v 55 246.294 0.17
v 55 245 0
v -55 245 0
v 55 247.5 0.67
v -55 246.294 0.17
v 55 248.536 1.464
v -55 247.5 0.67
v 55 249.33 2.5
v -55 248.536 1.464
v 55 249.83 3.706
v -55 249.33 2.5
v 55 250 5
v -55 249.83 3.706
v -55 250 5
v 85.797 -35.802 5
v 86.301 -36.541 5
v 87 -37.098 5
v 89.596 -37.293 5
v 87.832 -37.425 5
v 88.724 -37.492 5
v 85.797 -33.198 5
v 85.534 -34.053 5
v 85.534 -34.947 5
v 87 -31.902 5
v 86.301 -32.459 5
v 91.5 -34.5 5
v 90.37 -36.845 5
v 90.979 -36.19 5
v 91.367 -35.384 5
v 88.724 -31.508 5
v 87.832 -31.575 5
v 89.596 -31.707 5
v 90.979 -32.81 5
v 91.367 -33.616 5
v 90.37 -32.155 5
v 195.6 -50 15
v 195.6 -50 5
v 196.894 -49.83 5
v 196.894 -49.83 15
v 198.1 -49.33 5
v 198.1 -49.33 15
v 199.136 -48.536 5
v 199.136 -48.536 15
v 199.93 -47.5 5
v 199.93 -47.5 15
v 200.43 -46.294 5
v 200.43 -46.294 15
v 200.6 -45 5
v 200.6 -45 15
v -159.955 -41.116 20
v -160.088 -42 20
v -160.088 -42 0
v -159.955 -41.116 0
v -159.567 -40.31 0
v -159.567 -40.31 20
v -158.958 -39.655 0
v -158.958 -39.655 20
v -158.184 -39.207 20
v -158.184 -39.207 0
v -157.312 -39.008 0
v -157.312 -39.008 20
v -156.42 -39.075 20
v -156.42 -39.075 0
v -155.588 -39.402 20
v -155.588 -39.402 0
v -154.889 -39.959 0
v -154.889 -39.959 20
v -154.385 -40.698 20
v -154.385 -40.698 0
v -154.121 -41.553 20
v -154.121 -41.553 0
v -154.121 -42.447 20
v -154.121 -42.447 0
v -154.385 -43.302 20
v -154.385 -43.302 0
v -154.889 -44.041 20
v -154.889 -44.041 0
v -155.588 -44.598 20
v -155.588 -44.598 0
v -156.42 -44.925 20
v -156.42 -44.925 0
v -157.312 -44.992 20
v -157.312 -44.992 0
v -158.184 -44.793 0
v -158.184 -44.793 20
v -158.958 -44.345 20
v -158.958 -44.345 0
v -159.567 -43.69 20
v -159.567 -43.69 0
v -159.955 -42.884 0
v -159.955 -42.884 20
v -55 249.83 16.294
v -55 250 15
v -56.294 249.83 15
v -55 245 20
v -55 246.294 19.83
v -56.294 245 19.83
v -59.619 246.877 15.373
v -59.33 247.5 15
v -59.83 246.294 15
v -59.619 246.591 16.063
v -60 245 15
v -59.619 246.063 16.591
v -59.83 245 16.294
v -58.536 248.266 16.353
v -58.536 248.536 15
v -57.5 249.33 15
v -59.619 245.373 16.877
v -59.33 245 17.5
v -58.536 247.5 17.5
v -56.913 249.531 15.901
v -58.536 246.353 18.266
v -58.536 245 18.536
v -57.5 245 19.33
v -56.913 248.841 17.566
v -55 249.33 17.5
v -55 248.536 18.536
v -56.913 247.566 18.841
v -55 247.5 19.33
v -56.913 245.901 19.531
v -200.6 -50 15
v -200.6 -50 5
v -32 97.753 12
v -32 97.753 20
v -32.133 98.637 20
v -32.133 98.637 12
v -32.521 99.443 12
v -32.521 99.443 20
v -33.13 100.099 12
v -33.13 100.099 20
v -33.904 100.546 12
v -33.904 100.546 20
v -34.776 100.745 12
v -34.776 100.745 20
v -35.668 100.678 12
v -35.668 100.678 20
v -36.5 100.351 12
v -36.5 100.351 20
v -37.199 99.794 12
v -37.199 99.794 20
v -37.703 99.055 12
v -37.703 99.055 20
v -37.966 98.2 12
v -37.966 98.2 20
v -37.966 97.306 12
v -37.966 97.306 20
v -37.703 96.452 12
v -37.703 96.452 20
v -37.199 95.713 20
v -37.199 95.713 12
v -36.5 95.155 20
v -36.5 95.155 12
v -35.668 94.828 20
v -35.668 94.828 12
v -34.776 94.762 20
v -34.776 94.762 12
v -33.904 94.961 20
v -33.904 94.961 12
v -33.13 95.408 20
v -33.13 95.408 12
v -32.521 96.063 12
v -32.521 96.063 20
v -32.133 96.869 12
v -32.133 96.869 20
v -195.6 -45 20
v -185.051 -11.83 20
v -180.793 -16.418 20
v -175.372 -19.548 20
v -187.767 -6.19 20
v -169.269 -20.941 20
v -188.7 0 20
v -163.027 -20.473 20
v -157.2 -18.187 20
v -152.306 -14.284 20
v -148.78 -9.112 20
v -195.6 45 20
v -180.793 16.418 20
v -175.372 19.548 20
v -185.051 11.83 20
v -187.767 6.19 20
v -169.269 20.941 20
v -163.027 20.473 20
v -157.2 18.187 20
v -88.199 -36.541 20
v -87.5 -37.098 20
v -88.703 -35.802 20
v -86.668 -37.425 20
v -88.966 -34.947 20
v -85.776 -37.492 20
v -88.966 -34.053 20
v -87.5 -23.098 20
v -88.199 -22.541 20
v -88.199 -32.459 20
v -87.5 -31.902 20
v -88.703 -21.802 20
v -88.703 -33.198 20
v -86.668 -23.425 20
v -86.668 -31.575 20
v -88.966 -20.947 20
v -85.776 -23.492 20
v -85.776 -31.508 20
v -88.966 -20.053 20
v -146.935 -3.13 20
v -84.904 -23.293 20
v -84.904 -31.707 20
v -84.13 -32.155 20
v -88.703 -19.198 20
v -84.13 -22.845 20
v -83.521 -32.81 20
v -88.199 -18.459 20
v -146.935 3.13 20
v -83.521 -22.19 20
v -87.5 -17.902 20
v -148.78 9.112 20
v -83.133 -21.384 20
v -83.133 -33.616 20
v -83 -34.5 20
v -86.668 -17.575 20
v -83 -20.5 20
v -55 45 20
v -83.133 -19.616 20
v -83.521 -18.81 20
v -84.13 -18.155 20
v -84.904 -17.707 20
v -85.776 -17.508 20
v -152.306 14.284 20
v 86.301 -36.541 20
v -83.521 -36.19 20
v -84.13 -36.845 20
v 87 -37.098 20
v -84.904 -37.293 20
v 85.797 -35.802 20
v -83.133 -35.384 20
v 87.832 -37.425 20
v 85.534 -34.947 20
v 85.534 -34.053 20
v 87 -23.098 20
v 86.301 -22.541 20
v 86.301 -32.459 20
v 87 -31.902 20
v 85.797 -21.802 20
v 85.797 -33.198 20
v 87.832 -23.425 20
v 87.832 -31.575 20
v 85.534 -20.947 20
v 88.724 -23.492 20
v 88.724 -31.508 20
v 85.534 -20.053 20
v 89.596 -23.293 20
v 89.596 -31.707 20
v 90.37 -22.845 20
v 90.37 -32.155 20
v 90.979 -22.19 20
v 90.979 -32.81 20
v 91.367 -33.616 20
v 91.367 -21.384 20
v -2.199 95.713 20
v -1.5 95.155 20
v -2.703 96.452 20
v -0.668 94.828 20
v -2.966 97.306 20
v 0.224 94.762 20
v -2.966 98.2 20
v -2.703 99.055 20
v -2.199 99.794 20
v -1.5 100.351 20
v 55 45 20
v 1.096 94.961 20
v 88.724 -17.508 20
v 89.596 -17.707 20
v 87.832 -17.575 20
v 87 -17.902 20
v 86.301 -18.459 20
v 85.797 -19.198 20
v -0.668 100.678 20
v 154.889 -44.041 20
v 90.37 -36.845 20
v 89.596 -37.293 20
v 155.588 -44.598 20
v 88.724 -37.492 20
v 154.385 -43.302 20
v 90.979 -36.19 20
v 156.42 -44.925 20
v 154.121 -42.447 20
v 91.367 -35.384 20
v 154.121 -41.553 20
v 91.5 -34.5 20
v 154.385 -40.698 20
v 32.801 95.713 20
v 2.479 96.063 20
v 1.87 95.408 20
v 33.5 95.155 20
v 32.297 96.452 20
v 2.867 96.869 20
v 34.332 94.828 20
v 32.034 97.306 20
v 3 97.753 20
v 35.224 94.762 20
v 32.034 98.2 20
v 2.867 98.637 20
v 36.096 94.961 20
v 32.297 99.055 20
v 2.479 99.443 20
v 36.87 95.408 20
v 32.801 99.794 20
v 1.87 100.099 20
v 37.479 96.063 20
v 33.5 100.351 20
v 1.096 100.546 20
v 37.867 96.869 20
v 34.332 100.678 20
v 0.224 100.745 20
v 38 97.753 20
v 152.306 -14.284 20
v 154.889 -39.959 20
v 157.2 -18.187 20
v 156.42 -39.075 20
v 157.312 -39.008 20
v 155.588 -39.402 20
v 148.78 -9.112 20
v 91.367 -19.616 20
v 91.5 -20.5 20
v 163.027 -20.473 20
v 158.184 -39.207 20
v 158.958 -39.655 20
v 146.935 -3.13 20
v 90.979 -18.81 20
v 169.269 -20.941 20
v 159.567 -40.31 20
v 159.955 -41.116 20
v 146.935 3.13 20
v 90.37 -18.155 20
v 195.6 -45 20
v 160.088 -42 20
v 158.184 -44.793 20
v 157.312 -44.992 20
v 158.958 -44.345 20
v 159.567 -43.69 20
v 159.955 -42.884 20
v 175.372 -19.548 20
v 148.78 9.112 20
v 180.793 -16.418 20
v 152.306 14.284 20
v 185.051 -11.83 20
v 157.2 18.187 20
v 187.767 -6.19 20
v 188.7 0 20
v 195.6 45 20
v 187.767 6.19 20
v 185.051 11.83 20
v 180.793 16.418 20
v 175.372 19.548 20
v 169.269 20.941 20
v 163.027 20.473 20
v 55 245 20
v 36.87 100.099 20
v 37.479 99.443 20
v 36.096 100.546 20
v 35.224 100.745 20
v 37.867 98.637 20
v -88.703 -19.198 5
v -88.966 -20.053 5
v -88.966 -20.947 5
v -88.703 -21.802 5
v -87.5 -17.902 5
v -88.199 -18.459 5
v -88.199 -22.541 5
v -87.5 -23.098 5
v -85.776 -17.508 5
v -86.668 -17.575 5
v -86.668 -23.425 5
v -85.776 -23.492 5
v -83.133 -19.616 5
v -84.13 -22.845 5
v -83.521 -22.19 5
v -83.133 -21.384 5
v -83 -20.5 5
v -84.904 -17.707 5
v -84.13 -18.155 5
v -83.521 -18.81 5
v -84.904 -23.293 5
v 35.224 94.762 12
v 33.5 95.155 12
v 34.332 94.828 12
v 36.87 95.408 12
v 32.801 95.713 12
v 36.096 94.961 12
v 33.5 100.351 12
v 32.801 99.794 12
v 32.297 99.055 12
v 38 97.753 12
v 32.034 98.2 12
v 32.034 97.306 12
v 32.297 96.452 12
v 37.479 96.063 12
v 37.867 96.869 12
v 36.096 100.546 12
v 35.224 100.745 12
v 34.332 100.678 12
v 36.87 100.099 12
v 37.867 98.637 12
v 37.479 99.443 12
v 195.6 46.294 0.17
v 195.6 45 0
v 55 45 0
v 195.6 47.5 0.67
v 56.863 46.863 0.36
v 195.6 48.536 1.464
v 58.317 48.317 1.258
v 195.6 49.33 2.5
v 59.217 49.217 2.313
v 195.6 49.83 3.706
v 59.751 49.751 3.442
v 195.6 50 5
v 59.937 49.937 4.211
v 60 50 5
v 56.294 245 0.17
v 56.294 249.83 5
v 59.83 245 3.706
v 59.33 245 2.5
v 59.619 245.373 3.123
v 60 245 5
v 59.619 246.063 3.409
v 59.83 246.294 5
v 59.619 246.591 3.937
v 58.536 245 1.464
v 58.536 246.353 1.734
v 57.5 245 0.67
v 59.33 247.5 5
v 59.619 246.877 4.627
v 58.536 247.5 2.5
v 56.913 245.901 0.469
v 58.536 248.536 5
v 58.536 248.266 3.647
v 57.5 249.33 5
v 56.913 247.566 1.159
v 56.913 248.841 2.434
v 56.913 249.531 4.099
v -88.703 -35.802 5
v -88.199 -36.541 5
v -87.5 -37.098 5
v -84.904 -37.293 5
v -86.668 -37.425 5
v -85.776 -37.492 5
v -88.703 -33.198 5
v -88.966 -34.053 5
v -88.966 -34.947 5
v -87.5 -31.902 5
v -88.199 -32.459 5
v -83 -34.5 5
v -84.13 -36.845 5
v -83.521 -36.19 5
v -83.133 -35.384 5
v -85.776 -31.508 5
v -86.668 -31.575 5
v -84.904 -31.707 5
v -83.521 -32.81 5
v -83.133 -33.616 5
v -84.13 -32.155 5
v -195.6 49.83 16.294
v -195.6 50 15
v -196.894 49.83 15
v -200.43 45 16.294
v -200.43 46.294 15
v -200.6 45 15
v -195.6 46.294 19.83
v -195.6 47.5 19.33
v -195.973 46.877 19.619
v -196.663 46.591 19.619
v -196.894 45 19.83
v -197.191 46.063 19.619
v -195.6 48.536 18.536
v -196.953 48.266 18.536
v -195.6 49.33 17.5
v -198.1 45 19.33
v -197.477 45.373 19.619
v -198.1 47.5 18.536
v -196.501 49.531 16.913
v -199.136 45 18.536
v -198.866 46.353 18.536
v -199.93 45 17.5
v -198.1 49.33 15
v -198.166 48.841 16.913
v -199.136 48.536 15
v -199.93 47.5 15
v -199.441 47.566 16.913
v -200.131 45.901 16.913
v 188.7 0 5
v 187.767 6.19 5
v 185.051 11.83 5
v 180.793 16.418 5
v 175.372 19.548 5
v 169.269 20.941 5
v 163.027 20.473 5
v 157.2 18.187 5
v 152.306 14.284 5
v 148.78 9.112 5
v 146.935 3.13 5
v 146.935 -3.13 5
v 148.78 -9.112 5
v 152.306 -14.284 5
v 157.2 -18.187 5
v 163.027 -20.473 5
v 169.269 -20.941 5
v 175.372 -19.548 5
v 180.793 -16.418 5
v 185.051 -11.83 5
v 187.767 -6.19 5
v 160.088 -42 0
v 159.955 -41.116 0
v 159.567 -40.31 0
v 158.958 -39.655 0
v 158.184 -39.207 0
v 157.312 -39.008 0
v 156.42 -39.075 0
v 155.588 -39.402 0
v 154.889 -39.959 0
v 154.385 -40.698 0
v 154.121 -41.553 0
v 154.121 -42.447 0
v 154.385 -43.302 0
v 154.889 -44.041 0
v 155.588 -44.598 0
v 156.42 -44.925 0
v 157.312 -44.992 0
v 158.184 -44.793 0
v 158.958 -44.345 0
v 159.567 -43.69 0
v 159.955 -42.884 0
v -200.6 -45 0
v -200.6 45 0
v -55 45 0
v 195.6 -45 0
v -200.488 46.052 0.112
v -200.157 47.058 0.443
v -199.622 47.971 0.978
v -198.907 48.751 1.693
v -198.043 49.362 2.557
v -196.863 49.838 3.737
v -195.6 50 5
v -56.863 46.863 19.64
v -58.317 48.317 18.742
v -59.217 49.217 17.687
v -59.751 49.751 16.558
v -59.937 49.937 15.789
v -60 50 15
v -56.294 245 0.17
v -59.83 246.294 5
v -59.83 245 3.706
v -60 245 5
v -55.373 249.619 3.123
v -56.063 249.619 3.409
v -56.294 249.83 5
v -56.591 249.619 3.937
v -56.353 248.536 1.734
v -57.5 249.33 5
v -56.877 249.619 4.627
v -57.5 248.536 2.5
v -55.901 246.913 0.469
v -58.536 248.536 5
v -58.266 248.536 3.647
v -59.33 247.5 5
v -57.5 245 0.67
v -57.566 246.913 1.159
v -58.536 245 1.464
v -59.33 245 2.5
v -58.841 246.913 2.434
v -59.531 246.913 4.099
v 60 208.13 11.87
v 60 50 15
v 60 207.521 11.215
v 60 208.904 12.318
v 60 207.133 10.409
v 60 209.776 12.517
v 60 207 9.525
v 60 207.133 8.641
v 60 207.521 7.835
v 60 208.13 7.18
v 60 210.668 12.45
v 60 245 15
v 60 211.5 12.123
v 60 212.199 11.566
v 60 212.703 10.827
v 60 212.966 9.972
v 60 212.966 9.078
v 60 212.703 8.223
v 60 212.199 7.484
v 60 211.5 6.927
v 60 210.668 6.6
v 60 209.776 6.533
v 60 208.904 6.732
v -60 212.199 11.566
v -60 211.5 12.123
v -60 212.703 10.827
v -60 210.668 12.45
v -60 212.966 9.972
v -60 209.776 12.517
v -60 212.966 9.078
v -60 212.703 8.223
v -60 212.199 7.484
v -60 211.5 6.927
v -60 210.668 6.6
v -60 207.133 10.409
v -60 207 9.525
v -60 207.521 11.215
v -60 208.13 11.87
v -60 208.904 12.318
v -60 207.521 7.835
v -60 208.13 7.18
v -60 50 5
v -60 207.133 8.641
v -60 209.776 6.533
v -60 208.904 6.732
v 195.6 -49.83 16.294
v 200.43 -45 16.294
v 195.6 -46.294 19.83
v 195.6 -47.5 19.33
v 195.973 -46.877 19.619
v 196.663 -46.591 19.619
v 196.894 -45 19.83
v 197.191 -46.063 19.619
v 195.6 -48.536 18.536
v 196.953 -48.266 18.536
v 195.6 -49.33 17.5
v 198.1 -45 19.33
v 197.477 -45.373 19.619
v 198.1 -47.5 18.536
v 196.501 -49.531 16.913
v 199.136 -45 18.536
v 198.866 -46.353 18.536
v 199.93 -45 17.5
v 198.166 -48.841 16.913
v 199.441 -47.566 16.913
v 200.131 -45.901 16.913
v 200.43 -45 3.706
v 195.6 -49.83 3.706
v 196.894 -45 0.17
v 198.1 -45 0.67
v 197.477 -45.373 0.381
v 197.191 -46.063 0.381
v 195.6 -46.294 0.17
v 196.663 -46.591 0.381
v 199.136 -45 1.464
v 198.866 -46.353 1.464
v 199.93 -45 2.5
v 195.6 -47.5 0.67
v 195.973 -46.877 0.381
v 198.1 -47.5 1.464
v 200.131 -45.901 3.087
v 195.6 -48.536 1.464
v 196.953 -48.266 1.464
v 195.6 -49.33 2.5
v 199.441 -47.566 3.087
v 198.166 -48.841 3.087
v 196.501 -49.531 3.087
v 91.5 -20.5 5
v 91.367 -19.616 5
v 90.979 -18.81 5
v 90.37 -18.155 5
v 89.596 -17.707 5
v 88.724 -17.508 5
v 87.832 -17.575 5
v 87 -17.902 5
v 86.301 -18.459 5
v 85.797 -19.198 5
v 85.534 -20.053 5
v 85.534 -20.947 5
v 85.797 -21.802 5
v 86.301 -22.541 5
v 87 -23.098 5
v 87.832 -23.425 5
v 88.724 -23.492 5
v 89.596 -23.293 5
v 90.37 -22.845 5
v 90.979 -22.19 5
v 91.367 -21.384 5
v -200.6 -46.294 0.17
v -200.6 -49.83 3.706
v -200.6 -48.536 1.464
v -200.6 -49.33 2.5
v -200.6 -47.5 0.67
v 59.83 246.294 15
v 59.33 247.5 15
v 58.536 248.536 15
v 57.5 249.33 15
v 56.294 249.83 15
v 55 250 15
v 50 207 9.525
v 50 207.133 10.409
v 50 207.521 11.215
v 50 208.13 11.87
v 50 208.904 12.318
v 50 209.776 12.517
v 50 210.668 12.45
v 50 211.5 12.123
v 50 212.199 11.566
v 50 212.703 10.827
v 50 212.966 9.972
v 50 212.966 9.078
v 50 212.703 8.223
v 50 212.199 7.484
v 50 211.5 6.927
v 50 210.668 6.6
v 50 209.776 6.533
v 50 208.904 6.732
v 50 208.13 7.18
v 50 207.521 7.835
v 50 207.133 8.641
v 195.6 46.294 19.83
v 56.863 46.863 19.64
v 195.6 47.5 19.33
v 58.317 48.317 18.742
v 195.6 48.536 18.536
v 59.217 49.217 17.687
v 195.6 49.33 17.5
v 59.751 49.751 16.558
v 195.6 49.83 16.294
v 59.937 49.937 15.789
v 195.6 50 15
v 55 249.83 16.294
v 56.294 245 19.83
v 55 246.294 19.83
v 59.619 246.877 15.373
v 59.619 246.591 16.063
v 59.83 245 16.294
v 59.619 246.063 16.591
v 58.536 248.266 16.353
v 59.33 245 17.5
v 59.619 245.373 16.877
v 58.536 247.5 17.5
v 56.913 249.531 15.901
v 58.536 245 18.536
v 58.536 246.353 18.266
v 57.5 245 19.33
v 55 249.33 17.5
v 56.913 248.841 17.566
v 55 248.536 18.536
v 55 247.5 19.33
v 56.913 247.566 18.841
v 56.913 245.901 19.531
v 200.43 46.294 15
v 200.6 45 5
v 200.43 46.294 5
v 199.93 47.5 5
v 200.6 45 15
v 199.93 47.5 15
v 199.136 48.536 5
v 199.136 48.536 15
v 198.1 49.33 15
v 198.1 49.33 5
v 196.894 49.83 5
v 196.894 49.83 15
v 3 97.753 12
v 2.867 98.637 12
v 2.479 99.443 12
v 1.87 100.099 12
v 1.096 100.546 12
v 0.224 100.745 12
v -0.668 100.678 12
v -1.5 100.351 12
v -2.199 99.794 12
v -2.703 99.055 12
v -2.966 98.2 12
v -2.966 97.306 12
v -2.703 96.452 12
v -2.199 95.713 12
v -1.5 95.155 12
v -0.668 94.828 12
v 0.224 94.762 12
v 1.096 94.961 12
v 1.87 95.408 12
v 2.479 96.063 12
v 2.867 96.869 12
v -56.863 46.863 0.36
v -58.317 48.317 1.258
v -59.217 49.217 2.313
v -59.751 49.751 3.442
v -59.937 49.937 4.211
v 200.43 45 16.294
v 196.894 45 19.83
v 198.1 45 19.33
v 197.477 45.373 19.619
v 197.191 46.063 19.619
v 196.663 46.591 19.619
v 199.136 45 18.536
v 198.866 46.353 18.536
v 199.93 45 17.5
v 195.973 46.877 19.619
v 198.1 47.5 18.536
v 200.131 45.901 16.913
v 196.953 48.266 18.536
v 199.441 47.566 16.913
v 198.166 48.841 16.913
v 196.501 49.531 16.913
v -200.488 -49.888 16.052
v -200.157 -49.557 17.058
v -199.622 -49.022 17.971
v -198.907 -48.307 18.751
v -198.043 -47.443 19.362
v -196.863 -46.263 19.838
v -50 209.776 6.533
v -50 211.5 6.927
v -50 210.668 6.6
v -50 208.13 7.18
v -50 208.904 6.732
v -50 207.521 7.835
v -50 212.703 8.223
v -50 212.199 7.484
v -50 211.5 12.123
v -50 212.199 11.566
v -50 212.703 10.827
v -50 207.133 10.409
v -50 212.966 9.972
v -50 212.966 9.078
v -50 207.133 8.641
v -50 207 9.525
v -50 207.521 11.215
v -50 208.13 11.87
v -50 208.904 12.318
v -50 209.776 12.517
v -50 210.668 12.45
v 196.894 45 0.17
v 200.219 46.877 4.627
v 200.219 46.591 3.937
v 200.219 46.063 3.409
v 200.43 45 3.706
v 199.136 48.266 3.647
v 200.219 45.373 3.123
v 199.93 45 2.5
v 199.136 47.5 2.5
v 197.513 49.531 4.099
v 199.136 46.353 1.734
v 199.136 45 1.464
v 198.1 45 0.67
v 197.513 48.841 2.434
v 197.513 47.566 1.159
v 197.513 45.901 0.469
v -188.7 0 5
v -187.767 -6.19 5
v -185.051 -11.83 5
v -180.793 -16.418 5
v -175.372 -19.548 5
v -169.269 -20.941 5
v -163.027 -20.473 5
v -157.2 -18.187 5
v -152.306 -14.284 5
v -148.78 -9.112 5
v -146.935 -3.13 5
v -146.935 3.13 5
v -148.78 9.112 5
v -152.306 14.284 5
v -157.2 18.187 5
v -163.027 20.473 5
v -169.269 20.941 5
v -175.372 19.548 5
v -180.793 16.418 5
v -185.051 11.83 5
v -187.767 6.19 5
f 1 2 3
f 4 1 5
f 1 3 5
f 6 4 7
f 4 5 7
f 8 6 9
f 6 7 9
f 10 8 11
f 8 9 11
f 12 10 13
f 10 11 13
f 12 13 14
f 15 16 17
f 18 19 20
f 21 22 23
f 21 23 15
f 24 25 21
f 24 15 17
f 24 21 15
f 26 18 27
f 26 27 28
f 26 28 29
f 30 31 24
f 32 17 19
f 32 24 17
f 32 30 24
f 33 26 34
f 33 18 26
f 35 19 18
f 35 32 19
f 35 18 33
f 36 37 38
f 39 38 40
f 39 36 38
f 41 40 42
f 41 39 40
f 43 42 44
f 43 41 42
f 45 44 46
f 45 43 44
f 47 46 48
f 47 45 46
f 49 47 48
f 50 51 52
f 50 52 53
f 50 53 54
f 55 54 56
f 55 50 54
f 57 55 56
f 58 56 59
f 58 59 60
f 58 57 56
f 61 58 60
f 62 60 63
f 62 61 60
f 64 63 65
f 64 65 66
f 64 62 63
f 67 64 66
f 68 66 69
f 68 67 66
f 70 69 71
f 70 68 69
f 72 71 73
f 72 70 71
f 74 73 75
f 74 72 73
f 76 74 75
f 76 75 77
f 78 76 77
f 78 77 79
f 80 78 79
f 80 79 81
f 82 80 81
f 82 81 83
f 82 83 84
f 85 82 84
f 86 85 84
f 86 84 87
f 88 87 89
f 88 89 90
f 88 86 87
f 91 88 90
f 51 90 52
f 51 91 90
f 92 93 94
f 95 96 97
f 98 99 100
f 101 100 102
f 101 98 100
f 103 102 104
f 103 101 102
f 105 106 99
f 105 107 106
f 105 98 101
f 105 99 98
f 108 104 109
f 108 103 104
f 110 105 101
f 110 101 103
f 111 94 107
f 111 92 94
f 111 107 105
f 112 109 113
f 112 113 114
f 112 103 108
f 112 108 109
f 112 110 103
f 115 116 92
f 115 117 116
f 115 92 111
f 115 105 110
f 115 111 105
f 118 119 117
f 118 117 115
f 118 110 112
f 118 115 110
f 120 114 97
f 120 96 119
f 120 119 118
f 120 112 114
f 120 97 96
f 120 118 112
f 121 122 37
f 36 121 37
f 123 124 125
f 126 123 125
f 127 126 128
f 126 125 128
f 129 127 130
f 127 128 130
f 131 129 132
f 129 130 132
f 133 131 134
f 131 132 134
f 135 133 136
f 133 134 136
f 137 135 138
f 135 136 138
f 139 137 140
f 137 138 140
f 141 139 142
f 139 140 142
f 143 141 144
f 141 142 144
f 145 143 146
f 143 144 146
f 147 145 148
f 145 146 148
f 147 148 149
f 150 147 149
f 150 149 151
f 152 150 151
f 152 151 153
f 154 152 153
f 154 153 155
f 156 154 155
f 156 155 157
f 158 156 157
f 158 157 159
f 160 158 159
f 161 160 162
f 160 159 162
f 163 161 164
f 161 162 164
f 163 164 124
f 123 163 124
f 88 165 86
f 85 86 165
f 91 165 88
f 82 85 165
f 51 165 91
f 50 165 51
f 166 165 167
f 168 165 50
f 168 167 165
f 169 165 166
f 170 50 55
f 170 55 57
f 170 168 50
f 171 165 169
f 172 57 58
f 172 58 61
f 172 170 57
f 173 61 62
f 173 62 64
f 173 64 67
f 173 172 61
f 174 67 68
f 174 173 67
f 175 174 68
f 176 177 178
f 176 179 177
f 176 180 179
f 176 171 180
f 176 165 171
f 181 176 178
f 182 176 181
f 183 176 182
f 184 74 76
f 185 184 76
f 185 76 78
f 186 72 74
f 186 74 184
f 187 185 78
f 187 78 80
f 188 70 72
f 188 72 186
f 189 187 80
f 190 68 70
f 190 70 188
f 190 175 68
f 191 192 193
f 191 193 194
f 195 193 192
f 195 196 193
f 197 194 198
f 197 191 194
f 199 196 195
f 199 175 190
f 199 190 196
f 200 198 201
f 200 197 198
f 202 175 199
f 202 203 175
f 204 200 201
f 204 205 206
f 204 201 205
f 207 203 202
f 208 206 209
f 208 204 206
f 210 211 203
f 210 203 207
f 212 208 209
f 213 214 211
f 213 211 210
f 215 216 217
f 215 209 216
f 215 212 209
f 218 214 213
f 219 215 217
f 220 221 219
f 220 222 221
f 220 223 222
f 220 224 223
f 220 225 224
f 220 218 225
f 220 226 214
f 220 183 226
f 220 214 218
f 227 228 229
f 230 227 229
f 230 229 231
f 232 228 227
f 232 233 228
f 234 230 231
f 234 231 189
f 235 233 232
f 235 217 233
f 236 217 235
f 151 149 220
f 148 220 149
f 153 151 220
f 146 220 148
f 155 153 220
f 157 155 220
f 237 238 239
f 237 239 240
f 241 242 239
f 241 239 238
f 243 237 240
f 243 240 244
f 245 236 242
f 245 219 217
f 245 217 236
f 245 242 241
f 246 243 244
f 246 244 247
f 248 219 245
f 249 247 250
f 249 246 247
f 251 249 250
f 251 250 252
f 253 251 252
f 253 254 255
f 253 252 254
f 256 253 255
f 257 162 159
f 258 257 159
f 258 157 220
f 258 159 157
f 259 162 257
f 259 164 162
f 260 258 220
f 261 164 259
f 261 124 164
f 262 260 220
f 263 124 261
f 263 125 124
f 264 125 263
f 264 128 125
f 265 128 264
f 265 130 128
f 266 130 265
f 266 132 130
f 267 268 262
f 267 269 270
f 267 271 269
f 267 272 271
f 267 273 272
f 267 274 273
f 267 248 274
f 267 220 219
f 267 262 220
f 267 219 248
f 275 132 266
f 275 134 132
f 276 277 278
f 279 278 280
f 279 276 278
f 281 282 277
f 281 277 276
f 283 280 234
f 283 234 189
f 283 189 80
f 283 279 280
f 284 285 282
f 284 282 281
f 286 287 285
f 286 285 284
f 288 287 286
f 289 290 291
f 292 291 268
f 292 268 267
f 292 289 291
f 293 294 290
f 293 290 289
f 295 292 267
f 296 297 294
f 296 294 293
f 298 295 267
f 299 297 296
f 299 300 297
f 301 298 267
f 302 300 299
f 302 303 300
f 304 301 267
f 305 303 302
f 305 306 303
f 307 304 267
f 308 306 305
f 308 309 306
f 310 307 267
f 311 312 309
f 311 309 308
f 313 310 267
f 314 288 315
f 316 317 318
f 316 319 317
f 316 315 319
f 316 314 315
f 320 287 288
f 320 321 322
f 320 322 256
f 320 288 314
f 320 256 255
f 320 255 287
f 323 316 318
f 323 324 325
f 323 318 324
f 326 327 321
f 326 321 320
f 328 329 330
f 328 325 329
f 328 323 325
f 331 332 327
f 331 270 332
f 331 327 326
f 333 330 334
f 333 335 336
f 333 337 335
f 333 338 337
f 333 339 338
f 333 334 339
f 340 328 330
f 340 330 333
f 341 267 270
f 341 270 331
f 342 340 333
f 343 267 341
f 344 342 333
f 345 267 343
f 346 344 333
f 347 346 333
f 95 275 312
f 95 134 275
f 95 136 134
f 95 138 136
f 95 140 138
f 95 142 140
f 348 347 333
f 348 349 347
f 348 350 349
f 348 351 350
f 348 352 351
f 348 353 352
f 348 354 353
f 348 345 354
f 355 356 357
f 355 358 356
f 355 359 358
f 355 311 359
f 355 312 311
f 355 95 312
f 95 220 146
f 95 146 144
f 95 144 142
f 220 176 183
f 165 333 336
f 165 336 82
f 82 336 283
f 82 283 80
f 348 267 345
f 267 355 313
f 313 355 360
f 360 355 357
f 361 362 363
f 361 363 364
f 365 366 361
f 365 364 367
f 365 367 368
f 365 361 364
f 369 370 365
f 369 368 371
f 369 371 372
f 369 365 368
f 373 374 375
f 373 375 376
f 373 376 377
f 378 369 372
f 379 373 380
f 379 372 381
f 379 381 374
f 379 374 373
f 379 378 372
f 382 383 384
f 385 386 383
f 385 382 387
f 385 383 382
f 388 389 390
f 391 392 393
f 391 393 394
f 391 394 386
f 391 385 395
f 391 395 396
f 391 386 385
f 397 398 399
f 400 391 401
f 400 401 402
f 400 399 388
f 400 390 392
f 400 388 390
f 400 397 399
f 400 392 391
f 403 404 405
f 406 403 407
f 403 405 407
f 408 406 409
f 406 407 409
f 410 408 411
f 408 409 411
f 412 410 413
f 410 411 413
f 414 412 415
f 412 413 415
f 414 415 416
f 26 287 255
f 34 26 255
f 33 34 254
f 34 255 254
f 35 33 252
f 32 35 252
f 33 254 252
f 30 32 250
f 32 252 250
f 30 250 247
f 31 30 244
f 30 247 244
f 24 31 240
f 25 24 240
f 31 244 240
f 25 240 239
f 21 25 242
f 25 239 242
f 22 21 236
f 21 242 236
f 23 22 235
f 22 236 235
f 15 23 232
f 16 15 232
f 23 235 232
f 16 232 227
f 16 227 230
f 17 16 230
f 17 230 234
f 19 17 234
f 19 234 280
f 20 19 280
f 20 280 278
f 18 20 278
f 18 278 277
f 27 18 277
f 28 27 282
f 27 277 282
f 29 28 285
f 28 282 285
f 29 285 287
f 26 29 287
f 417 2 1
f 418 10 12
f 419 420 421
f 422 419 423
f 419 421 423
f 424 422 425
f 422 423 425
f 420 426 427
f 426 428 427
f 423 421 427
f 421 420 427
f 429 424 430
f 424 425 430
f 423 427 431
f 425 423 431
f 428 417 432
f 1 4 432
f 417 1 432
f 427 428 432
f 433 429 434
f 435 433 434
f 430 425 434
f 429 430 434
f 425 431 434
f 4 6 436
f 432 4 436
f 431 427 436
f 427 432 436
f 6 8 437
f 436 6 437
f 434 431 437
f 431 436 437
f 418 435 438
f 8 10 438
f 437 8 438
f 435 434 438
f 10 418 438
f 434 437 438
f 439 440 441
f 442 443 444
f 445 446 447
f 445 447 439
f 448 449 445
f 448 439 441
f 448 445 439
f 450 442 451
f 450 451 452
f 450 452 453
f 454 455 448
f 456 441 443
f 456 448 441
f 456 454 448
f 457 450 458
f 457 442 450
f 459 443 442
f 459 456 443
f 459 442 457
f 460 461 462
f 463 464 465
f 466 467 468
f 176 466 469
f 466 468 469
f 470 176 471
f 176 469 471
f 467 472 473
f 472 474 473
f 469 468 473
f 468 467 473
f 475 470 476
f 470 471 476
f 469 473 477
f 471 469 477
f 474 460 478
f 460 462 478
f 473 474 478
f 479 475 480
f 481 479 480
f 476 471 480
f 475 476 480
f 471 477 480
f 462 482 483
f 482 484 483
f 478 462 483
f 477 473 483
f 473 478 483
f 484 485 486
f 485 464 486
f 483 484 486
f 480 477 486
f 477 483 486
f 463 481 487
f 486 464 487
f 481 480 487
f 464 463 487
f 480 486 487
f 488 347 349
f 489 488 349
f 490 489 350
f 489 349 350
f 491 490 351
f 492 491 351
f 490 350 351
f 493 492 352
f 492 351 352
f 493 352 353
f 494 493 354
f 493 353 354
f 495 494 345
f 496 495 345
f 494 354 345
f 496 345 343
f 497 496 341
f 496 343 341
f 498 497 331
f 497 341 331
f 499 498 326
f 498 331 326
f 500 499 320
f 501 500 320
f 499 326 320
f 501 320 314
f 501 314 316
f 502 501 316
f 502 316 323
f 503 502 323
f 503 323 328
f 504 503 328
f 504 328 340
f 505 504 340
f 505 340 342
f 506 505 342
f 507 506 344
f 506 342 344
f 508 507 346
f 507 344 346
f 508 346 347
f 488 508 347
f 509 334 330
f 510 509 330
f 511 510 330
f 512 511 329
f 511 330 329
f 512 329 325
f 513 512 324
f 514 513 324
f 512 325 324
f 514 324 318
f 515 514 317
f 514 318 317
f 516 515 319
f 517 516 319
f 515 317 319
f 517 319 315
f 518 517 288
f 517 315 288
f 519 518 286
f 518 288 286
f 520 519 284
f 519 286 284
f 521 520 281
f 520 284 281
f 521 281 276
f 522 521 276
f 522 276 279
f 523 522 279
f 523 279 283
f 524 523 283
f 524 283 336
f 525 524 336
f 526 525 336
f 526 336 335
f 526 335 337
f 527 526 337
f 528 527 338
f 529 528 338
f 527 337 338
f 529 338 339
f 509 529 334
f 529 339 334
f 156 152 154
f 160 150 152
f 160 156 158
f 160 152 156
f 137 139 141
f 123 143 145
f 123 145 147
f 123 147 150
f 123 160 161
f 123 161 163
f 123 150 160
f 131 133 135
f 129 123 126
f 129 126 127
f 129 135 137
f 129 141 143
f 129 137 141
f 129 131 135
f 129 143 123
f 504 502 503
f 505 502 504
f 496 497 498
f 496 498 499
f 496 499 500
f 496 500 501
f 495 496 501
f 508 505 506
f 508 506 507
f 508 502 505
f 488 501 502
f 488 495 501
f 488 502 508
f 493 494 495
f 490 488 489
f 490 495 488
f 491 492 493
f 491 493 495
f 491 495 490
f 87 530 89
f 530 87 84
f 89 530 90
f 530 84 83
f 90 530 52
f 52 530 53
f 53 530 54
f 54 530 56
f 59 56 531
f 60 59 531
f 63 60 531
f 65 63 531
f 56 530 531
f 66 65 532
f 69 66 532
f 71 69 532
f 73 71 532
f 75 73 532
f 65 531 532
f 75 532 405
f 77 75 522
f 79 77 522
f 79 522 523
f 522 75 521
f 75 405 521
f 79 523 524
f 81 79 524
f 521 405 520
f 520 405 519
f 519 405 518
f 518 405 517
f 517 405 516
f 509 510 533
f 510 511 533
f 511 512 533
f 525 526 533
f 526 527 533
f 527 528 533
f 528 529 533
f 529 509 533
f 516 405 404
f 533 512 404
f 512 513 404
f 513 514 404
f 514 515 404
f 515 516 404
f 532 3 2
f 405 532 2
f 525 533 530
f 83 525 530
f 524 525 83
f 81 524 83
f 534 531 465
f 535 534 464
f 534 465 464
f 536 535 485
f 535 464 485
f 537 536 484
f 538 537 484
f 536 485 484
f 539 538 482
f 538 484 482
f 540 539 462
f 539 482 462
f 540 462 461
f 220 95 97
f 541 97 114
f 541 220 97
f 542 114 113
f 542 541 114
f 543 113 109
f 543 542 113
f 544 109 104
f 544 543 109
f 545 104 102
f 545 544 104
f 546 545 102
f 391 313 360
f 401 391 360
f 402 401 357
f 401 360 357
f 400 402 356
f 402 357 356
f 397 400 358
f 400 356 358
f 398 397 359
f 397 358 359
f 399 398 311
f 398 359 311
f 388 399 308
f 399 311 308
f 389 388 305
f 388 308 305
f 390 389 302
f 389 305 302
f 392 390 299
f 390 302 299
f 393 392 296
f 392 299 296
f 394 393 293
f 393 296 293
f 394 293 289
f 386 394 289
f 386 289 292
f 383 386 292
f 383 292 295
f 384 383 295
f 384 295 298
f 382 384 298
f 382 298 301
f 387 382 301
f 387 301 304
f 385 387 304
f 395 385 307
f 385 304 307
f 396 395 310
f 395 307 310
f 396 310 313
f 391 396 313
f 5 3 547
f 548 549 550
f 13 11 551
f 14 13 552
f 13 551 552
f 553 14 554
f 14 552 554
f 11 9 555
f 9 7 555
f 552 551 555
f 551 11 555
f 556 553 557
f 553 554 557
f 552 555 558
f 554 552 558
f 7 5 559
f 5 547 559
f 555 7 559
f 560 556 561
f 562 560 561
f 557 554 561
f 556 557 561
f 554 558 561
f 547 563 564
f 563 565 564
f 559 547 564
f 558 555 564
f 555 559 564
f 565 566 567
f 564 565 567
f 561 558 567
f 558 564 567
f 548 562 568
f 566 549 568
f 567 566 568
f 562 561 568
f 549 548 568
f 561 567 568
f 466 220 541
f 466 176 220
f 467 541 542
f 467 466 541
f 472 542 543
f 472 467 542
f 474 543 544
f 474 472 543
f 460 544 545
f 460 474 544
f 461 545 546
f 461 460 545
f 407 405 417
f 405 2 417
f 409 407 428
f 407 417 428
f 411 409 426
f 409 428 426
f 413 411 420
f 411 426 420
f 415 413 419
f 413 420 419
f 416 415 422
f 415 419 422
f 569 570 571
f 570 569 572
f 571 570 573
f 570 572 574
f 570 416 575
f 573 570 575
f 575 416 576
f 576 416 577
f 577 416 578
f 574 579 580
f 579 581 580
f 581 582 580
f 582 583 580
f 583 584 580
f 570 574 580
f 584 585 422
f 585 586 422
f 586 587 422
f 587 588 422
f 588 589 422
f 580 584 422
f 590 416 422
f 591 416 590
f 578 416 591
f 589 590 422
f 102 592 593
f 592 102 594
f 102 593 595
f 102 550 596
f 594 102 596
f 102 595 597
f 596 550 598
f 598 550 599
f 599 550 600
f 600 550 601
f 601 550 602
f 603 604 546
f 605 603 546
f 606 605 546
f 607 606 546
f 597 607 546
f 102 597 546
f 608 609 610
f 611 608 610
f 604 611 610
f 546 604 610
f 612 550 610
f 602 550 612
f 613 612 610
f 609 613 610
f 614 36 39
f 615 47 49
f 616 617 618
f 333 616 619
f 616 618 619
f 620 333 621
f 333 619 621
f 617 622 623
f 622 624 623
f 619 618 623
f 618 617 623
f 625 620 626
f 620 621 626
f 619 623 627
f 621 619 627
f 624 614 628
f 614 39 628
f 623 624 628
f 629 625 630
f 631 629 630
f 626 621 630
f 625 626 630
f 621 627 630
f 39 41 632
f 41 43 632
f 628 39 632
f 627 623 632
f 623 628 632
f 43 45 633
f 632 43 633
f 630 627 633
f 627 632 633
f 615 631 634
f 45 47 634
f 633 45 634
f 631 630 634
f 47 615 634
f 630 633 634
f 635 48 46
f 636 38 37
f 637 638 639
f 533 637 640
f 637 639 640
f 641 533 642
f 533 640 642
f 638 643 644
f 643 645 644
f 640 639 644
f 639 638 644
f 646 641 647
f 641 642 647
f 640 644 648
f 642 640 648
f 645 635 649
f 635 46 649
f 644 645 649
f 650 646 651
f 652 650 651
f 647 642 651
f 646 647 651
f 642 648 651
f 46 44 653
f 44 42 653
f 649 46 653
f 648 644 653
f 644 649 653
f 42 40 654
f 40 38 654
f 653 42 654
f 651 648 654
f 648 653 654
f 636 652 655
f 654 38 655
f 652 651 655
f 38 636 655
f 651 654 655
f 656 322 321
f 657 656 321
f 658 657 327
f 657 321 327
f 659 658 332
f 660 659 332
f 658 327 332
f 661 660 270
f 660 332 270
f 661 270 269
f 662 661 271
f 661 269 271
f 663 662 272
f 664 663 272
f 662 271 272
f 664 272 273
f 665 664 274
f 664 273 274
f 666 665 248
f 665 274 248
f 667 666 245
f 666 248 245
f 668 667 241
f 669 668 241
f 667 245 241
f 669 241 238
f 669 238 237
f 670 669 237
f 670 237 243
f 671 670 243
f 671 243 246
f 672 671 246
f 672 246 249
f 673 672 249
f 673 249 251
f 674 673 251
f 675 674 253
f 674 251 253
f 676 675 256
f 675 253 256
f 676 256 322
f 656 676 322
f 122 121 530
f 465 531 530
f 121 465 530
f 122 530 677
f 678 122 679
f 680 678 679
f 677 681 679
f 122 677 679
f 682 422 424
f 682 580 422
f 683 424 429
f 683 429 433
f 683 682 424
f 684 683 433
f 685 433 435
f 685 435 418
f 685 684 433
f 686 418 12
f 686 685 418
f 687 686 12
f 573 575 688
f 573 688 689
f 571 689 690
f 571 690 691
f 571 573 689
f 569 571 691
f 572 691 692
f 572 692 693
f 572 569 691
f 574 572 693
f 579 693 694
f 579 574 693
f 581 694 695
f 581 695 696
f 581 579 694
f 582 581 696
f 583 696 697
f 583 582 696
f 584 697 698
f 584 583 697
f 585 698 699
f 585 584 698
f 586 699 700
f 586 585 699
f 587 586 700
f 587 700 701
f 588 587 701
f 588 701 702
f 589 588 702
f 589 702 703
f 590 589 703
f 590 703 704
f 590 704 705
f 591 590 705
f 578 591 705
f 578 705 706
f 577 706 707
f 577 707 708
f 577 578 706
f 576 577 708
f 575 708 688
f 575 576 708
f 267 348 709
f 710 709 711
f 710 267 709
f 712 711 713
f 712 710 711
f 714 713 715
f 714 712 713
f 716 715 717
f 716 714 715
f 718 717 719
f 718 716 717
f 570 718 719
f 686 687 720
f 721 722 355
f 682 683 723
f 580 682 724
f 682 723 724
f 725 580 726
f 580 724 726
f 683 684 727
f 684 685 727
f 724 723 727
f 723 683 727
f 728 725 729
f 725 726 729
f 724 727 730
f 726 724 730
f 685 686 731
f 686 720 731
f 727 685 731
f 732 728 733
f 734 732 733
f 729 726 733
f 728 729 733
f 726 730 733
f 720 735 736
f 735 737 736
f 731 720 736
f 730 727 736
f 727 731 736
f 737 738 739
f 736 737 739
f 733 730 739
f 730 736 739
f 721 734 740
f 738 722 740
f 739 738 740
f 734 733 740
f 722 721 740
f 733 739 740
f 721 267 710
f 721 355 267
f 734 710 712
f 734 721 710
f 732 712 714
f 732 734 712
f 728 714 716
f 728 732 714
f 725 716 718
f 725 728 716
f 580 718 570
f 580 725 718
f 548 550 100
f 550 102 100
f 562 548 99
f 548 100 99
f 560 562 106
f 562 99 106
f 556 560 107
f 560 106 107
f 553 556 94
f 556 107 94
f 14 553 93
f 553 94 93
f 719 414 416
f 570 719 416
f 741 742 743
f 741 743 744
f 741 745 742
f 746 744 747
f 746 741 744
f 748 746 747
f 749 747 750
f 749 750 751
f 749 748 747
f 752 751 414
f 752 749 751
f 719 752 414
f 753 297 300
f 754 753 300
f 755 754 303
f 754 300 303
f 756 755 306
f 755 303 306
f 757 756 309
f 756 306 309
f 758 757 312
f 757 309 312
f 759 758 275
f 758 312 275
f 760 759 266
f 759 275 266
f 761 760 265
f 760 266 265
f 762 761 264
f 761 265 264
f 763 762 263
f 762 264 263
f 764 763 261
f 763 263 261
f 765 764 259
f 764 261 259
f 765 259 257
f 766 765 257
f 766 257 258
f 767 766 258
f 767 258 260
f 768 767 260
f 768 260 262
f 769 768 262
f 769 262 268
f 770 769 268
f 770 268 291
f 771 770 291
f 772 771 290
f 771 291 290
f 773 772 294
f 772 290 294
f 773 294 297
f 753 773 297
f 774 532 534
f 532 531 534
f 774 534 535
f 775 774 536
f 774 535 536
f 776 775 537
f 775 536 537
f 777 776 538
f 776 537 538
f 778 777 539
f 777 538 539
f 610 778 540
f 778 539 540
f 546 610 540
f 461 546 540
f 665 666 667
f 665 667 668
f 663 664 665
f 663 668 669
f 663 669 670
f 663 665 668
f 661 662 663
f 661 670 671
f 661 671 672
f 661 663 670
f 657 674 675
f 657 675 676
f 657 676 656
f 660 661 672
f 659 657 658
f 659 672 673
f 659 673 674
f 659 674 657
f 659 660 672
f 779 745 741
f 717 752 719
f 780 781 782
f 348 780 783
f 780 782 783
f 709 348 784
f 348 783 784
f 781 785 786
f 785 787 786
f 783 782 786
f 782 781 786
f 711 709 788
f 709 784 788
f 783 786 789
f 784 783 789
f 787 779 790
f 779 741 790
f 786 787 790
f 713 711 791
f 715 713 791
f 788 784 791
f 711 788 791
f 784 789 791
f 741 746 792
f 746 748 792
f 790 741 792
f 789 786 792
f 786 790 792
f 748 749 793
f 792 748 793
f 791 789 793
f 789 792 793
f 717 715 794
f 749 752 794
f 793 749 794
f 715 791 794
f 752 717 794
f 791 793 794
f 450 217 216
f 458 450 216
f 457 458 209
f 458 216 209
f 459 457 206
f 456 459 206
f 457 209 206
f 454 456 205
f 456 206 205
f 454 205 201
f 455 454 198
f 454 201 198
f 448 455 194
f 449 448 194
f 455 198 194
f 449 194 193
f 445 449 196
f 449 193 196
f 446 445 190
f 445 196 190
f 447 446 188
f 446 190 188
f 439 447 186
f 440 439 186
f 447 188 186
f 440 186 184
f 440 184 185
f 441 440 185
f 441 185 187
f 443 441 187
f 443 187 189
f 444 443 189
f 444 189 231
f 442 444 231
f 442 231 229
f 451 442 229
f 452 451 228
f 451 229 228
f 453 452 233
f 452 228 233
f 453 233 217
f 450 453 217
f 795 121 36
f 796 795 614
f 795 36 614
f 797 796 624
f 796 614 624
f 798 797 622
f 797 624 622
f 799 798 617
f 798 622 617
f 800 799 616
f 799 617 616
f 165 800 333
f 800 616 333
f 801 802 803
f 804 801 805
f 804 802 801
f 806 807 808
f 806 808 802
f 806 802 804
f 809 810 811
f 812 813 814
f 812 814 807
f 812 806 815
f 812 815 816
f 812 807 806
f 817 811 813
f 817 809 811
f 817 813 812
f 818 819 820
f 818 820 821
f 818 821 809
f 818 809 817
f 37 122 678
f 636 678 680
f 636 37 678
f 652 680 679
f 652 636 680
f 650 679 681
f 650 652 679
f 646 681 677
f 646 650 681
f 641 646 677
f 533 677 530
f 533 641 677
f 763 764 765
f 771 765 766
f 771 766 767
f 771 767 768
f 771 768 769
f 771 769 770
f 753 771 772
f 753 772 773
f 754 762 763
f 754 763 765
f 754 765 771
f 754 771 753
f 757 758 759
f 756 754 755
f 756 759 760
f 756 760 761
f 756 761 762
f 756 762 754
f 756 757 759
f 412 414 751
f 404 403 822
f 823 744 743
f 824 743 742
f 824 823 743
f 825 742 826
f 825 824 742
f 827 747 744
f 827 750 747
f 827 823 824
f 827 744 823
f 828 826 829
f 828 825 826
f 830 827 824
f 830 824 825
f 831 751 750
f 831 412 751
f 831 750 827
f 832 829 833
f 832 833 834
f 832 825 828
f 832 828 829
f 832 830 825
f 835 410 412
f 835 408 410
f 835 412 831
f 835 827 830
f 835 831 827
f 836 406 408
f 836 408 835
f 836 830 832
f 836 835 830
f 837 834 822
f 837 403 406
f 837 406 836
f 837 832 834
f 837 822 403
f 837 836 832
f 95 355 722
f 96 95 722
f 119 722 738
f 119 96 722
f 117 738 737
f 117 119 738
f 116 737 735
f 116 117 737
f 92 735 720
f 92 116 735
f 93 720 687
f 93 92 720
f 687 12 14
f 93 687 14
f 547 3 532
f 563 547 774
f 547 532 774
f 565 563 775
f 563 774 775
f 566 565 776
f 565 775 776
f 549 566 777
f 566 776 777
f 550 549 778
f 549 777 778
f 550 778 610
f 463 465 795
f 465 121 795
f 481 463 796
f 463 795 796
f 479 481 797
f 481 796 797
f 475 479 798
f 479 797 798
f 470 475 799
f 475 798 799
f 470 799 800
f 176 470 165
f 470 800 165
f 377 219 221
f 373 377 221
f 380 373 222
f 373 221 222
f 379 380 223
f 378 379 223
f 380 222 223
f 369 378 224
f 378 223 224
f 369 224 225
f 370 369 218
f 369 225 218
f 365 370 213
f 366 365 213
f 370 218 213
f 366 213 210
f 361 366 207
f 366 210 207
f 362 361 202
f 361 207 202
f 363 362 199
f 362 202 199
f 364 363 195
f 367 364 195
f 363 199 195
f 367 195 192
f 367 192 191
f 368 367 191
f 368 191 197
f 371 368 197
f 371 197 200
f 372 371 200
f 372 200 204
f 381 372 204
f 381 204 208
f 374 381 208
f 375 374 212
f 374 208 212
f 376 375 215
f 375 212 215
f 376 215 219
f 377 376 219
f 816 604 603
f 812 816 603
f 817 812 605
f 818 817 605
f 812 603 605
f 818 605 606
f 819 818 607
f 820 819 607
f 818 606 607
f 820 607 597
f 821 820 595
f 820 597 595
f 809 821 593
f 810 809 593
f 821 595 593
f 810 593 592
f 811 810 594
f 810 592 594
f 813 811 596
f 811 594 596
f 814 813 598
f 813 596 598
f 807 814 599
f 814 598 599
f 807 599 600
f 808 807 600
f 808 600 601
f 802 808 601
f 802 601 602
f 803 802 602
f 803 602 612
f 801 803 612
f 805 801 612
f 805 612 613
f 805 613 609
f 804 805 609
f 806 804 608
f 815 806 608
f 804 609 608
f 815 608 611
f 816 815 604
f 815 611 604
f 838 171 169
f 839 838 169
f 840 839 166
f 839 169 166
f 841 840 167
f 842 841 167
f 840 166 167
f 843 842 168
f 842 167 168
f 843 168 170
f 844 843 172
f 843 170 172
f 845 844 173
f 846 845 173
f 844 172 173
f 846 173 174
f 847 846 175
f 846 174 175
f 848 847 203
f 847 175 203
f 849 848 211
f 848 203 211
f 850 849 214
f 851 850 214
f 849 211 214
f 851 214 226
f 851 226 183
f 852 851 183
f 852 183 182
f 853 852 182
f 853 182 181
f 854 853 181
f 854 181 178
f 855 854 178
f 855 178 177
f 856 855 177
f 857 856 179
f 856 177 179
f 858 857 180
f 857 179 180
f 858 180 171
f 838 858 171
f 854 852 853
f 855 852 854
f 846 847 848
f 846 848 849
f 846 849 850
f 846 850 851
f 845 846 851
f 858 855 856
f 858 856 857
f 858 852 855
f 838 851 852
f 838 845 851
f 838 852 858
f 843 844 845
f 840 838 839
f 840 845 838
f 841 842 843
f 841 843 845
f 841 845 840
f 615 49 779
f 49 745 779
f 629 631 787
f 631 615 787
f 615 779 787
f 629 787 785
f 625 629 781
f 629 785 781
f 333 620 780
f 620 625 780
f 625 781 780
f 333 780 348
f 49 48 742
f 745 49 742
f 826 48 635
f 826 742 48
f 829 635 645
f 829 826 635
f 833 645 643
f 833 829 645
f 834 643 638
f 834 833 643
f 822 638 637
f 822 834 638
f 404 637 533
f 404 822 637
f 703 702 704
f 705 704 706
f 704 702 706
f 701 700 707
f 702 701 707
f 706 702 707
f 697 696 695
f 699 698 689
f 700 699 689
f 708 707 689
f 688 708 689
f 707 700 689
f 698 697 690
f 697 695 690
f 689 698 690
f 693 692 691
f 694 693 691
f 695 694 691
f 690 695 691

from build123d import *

# Parameters (mm, degrees)
BOSS_EXTRUDE1_DEPTH = 20
SKETCH2_R           = 21
CUT_EXTRUDE1_DEPTH  = 15
SKETCH3_R           = 3
CUT_EXTRUDE2_DEPTH  = 8
SKETCH4_R           = 3
CUT_EXTRUDE3_DEPTH  = 15
SKETCH5_R           = 3
CUT_EXTRUDE4_DEPTH  = 20
FILLET1_R           = 5
SKETCH6_R           = 3
CUT_EXTRUDE7_DEPTH  = 10


with BuildPart() as part:
    # Sketch1 → Boss-Extrude1 (new body)
    with BuildSketch(Plane.XY):
        Polygon((-200.6, -50), (200.6, -50), (200.6, 50), (60, 50), (60, 250), (-60, 250), (-60, 50), (-200.6, 50), align=None)
    extrude(amount=BOSS_EXTRUDE1_DEPTH)

    # Sketch2 → Cut-Extrude1 (cut)
    with BuildSketch(Plane.XY.offset(20)):
        with Locations((167.7, 0)):
            Circle(SKETCH2_R)
        with Locations(Location((-167.7, 0, 0), (0, 0, 180))):
            Circle(SKETCH2_R)
    extrude(amount=-CUT_EXTRUDE1_DEPTH, mode=Mode.SUBTRACT)

    # Sketch3 → Cut-Extrude2 (cut)
    with BuildSketch(Plane.XY.offset(20)):
        with Locations((-35, 97.753157488)):
            Circle(SKETCH3_R)
        with Locations((35, 97.753157488)):
            Circle(SKETCH3_R)
        with Locations((0, 97.753157488)):
            Circle(SKETCH3_R)
    extrude(amount=-CUT_EXTRUDE2_DEPTH, mode=Mode.SUBTRACT)

    # Sketch4 → Cut-Extrude3 (cut)
    with BuildSketch(Plane.XY.offset(20)):
        with Locations((-86, -20.5)):
            Circle(SKETCH4_R)
        with Locations((88.5, -20.5)):
            Circle(SKETCH4_R)
        with Locations((88.5, -34.5)):
            Circle(SKETCH4_R)
        with Locations((-86, -34.5)):
            Circle(SKETCH4_R)
    extrude(amount=-CUT_EXTRUDE3_DEPTH, mode=Mode.SUBTRACT)

    # Sketch5 → Cut-Extrude4 (cut)
    with BuildSketch(Plane.XY.offset(20)):
        with Locations((157.08787293, -42)):
            Circle(SKETCH5_R)
    cut_extrude4 = extrude(amount=-CUT_EXTRUDE4_DEPTH, mode=Mode.SUBTRACT)

    # Mirror2: Cut-Extrude4 across plane
    add(cut_extrude4.mirror(Plane(origin=(0, 0, 0), x_dir=(0, 0, 1), z_dir=(1, 0, 0))), mode=Mode.SUBTRACT)

    # Fillet1
    fillet1_edges = [part.edges().sort_by_distance(p)[0] for p in [
        (-60, 150, 0),
        (0, 250, 0),
        (60, 150, 0),
        (130.3, 50, 0),
        (0, 250, 20),
        (200.6, 50, 10),
        (200.6, -50, 10),
        (-200.6, 50, 10),
        (-60, 250, 10),
        (60, 250, 10),
        (-60, 150, 20),
        (-130.3, 50, 20),
        (-200.6, 0, 20),
        (0, -50, 20),
        (200.6, 0, 20),
        (130.3, 50, 20),
        (200.6, 0, 0),
        (60, 150, 20),
        (0, -50, 0),
        (-130.3, 50, 0),
    ]]
    fillet(fillet1_edges, radius=FILLET1_R - 0.0001)  # a hair under: the kernel refuses the full size

    # Sketch6 → Cut-Extrude7 (cut)
    with BuildSketch(Plane.ZY.offset(60)):
        with Locations(Location((9.525, 210, 0), (0, 0, 270))):
            Circle(SKETCH6_R)
    cut_extrude7 = extrude(amount=-CUT_EXTRUDE7_DEPTH, mode=Mode.SUBTRACT)

    # Mirror3: Cut-Extrude7 across plane
    add(cut_extrude7.mirror(Plane(origin=(0, 0, 0), x_dir=(0, 0, 1), z_dir=(1, 0, 0))), mode=Mode.SUBTRACT)


solid = part.part
